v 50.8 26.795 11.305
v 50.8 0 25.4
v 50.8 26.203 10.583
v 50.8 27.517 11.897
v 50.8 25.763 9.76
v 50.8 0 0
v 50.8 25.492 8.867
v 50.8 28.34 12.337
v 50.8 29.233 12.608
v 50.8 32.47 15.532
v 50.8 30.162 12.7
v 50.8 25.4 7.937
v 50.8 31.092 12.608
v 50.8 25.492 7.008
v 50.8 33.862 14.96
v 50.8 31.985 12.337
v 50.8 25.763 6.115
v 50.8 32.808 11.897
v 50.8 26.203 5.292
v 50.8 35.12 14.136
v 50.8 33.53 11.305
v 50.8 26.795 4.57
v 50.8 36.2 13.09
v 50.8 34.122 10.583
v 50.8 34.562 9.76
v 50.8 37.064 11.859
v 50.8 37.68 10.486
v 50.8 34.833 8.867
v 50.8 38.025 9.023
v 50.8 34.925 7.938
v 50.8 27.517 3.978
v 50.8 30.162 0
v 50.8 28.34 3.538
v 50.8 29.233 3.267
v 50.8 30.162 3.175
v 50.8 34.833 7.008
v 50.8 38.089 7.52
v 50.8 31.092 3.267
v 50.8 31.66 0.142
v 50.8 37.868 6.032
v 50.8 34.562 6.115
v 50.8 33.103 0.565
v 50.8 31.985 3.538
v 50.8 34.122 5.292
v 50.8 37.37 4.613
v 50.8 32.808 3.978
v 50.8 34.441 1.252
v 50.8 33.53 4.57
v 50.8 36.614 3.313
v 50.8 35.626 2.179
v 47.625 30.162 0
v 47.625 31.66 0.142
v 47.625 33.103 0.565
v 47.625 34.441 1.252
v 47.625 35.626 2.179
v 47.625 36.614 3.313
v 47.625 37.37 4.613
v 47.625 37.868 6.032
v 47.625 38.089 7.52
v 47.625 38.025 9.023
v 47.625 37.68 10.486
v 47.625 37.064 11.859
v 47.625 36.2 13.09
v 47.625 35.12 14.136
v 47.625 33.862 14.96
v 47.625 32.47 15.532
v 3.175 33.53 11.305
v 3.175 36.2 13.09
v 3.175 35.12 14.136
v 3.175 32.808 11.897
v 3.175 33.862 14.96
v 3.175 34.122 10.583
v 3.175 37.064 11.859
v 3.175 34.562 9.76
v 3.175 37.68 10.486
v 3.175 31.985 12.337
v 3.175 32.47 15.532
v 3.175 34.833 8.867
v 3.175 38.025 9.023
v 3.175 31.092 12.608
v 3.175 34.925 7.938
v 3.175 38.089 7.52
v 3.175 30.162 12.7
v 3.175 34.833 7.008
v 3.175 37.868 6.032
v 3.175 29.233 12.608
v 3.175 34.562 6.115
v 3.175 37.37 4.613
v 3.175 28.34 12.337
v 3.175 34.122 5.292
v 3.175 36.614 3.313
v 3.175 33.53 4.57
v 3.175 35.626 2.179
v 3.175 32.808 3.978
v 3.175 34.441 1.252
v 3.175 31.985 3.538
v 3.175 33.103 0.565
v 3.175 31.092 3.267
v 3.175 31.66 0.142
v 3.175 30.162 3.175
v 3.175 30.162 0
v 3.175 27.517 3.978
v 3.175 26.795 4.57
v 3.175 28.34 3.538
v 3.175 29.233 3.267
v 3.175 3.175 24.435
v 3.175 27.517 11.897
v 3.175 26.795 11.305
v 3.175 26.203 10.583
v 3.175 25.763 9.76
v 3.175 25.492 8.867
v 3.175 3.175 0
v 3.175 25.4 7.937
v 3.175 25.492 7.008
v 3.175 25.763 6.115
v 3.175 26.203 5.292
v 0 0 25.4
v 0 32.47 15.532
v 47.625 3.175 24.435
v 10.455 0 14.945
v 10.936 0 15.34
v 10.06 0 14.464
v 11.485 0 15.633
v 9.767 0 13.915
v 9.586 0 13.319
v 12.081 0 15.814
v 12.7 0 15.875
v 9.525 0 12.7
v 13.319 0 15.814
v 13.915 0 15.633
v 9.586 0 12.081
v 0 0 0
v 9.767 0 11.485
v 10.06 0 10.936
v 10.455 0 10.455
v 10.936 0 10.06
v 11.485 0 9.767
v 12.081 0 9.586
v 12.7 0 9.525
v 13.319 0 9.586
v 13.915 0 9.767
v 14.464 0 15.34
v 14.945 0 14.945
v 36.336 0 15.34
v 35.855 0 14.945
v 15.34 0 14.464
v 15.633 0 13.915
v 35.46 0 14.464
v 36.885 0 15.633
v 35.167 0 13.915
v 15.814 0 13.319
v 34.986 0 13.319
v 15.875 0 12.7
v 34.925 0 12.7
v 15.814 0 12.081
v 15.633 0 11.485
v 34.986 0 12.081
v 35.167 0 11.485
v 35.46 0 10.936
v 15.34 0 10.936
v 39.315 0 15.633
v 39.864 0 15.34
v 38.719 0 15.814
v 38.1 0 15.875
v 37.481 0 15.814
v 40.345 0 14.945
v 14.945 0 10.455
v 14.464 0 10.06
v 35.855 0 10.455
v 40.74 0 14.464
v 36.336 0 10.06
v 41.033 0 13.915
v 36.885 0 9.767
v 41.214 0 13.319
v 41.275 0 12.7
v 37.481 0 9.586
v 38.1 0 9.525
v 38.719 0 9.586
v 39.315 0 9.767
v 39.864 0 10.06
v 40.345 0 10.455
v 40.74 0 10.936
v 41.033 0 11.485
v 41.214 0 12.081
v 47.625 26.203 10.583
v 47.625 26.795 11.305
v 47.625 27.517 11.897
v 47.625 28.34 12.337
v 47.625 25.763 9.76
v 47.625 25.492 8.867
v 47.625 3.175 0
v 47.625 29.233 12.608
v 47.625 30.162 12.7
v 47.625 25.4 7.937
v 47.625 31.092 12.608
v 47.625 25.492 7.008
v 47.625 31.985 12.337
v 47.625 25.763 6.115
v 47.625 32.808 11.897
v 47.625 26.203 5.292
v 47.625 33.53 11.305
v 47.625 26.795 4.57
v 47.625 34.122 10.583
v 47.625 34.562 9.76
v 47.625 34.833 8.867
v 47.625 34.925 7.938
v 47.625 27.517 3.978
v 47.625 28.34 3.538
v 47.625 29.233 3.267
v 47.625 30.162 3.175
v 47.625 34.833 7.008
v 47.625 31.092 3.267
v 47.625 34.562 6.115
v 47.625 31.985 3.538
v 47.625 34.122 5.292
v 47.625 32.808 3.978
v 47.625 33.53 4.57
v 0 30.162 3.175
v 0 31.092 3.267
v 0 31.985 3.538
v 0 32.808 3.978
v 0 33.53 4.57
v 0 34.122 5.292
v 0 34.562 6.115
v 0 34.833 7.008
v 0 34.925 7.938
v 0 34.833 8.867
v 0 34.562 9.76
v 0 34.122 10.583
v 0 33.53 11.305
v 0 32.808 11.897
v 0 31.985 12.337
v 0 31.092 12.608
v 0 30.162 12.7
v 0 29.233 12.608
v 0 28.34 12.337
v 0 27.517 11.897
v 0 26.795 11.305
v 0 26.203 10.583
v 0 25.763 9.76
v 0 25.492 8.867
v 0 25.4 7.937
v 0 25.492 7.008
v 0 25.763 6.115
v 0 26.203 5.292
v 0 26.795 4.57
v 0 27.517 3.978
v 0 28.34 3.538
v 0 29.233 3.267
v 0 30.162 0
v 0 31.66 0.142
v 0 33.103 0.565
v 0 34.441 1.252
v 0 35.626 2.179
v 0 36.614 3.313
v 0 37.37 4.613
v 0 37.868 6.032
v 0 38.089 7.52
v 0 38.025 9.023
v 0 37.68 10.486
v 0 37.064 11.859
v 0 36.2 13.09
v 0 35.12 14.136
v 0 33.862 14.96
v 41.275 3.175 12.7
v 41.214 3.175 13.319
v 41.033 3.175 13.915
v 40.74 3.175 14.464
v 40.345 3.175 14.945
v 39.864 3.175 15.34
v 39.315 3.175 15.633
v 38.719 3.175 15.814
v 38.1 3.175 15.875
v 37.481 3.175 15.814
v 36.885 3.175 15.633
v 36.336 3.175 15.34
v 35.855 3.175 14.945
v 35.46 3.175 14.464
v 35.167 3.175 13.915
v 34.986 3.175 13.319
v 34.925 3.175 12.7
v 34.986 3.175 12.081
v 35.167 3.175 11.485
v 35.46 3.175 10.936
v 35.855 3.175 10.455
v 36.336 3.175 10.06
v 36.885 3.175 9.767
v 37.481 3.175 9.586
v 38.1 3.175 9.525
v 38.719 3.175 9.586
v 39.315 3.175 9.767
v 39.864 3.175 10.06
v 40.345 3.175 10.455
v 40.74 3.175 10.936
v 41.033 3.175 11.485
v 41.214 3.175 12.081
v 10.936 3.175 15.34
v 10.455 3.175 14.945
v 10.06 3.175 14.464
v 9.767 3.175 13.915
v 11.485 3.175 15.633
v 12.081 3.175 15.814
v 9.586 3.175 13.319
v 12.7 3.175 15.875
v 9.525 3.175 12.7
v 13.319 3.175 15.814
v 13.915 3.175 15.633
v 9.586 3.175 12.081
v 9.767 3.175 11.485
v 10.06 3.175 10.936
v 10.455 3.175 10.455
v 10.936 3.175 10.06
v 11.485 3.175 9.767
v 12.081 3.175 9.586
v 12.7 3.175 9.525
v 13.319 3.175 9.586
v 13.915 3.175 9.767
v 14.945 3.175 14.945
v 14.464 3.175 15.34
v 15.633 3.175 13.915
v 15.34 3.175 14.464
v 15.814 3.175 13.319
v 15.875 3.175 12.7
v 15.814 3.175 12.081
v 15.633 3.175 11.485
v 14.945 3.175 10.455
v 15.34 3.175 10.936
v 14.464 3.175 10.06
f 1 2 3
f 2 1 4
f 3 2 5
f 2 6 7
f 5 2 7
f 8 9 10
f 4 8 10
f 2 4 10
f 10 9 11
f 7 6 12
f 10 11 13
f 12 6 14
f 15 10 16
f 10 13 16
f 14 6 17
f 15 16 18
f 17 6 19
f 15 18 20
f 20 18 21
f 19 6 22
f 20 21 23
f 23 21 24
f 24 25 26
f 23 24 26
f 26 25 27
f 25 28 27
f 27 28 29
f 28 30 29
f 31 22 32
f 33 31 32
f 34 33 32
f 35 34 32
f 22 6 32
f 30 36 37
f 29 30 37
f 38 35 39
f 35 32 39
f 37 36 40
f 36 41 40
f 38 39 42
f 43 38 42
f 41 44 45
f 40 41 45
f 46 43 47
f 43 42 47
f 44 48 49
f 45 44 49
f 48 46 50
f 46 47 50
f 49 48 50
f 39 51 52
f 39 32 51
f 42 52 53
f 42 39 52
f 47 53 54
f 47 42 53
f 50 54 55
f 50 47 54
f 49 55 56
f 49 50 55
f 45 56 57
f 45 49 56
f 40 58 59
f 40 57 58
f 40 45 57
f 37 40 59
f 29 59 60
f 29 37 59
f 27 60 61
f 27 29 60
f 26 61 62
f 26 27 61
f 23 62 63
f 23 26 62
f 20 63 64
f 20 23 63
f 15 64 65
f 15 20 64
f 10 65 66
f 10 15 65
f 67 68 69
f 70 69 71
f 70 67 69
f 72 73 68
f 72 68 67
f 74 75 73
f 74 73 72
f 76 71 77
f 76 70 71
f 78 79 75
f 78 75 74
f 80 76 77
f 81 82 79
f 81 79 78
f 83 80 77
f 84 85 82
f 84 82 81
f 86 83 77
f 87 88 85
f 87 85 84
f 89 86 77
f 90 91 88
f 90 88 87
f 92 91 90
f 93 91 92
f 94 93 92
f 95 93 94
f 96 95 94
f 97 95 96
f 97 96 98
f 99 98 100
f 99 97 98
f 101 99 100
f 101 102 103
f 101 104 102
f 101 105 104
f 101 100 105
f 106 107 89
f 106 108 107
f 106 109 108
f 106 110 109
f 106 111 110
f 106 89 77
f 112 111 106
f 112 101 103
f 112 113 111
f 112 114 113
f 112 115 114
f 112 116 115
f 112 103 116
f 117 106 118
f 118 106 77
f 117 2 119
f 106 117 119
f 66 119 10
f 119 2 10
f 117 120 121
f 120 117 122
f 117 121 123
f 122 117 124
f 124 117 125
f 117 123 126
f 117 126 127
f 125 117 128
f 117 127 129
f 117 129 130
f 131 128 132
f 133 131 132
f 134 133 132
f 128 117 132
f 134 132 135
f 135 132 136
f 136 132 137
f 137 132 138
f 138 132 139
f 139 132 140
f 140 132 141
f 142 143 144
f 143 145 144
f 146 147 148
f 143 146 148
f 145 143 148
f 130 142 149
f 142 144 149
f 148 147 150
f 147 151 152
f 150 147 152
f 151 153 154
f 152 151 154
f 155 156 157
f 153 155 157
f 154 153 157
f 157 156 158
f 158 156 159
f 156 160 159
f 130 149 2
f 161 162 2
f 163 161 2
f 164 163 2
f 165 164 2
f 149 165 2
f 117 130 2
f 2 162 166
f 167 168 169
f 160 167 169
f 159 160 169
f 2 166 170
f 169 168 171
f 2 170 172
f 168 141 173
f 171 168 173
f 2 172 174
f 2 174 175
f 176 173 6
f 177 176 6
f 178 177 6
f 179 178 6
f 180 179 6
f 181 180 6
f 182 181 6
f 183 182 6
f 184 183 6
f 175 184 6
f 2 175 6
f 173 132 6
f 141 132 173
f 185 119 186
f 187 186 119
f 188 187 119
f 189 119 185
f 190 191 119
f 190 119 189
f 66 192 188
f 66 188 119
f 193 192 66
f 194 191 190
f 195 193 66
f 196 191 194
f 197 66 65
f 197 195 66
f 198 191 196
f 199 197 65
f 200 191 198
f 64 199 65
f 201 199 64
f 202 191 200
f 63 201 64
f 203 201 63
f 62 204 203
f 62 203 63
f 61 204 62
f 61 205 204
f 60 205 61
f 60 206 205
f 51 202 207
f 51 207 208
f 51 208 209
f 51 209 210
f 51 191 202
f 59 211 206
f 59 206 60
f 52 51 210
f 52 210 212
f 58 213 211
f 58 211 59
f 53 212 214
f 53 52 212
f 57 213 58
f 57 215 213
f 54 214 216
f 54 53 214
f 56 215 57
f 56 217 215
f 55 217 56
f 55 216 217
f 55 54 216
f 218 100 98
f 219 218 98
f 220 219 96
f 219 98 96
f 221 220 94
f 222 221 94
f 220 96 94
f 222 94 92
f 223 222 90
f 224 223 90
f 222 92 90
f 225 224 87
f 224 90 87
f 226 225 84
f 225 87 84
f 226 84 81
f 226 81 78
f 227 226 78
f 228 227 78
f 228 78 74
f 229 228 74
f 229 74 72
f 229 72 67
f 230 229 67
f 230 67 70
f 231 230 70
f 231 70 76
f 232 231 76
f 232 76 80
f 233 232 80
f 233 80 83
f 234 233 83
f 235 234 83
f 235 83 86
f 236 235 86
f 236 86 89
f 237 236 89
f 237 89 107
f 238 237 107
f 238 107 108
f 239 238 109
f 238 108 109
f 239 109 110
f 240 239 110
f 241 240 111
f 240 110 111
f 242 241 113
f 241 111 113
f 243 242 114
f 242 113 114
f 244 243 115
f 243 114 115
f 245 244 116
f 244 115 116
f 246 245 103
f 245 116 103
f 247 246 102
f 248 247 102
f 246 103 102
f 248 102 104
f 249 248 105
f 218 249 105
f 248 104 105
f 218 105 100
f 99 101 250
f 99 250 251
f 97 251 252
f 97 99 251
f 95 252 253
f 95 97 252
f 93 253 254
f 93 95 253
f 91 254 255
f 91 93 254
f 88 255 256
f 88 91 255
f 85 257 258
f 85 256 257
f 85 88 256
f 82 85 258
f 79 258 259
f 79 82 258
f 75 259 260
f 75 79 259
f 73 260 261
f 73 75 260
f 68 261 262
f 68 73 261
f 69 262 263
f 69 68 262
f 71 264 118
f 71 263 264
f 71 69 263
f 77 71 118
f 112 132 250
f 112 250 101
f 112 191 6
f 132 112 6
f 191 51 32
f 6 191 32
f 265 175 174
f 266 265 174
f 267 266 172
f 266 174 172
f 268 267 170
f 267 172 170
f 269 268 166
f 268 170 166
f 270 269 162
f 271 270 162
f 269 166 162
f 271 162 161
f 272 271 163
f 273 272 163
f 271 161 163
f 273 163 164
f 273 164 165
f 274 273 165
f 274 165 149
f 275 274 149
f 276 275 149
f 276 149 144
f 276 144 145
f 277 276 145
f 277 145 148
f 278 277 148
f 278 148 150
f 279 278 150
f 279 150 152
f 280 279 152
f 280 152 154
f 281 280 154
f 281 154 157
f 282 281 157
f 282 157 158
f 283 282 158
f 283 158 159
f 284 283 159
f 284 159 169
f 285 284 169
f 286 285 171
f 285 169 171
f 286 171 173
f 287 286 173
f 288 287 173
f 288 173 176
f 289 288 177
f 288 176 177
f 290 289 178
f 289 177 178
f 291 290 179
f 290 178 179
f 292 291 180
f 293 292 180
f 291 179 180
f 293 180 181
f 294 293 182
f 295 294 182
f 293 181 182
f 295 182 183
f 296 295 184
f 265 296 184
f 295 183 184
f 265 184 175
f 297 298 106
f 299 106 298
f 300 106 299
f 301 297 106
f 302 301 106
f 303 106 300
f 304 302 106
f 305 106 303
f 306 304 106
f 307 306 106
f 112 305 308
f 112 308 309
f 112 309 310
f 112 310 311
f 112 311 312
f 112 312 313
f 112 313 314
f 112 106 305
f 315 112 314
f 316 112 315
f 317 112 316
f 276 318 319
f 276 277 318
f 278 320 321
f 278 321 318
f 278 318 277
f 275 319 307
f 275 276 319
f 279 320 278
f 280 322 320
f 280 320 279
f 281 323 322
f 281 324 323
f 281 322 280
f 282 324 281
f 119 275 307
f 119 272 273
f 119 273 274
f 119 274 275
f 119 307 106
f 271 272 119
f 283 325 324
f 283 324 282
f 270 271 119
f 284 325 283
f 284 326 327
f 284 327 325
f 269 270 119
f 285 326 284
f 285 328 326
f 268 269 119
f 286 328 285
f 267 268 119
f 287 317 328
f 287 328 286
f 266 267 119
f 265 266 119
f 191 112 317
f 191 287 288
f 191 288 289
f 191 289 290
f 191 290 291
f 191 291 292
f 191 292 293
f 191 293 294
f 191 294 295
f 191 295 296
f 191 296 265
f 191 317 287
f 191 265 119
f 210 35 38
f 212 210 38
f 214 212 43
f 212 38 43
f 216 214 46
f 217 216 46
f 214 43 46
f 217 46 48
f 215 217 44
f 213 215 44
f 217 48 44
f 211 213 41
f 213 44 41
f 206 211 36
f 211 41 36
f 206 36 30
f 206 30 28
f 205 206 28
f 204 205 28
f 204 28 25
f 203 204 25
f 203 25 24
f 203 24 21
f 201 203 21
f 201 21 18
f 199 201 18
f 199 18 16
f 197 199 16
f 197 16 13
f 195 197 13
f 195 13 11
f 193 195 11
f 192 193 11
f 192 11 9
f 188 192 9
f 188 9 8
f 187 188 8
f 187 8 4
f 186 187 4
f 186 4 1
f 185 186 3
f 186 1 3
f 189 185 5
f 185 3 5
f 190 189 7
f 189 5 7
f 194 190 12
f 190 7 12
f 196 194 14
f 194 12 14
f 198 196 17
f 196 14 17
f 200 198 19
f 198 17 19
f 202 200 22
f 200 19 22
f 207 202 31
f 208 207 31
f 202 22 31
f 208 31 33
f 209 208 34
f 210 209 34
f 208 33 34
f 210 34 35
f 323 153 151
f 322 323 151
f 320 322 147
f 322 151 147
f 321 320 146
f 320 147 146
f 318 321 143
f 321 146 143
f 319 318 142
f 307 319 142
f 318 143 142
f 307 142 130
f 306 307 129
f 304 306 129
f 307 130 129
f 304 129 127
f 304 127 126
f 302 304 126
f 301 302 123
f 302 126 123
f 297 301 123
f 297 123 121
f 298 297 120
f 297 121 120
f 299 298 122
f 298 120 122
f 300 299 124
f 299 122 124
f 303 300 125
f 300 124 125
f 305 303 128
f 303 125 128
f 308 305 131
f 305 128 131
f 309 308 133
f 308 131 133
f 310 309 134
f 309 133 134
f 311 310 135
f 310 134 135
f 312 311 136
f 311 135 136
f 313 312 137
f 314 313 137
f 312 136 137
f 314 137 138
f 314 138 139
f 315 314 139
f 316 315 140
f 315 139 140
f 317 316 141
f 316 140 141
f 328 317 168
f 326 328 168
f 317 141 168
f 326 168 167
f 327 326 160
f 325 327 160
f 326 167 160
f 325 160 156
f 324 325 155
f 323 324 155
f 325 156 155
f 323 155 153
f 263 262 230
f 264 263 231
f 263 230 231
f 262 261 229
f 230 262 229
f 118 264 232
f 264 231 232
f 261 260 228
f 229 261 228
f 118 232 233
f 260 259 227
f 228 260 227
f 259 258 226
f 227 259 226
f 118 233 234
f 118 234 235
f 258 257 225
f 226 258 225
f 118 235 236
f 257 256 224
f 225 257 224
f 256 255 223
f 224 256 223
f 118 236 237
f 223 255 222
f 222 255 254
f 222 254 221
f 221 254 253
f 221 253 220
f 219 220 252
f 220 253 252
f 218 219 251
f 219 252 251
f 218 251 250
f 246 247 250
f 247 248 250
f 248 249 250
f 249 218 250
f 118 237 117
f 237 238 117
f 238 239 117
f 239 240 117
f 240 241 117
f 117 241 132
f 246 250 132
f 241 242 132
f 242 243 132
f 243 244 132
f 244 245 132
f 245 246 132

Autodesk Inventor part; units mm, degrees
ref_plane "YZ Plane" through (0, 0, 0) normal (1, 0, 0) x (0, 1, 0)
ref_plane "XZ Plane" through (0, 0, 0) normal (0, 1, 0) x (-1, 0, 0)
ref_plane "XY Plane" through (0, 0, 0) normal (0, 0, 1) x (1, 0, 0)
sketch "Sketch1" plane through (0, 0, 0) normal (0, 0, 1) x (1, 0, 0)
  line L0 (0, 0) -> (50.8, 0)
  line L1 (50.8, 0) -> (50.8, 38.1)
  line L2 (0, 38.1) -> (0, 0)
  line L3 (3.175, 38.1) -> (3.175, 3.175)
  line L4 (3.175, 3.175) -> (47.625, 3.175)
  line L5 (47.625, 3.175) -> (47.625, 38.1)
  line L6 (50.8, 38.1) -> (47.625, 38.1)
  line L7 (3.175, 38.1) -> (0, 38.1)
  dimension "d0" = 38.1
  dimension "d1" = 50.8
  dimension "d2" = 3.175
  dimension "d3" = 3.175
  dimension "d4" = 3.175
extrude "Extrusion1" add sketch "Sketch1" along normal blind 25.4
sketch "Sketch2" plane through (50.8, 0, 0) normal (1, 0, 0) x (0, 0, -1)
  line L0 (-25.4, 38.1) -> (-25.4, 0) projected
  line L1 (0, 0) -> (-25.4, 0) projected
  line L2 (0, 0) -> (0, 38.1) projected
  line L3 (0, 38.1) -> (-25.4, 38.1) projected
  circle A0 centre (-7.9375, 30.1625) radius 4.7625
  arc A1 (0, 30.1625) -> (-15.532, 32.4705) centre (-7.9375, 30.1625) ccw
  line L4 (-25.4, 0) -> (-15.532, 32.4705)
  line L5 (0, 30.1625) -> (0, 0)
  dimension "d7" = 9.525
  dimension "d8" = 30.1625
  dimension "d9" = 17.4625
extrude "Extrusion2" cut sketch "Sketch2" against normal through all contours L3 A1 L4 L0 | L3 L2 A1 | A0
sketch "Sketch3" plane through (0, 0, 25.4) normal (0, -1, 0) x (1, 0, 0)
  line L0 (0, -25.4) -> (0, 0) projected
  line L1 (0, -25.4) -> (50.8, -25.4) projected
  line L2 (50.8, -25.4) -> (50.8, 0) projected
  circle A0 centre (12.7, -12.7) radius 3.175
  circle A1 centre (38.1, -12.7) radius 3.175
  dimension "d12" = 6.35
  dimension "d13" = 6.35
  dimension "d14" = 12.7
  dimension "d15" = 12.7
  dimension "d16" = 12.7
extrude "Extrusion3" cut sketch "Sketch3" against normal through all
equation "\"d3\" = d2"
equation "\"d4\" = d3"
equation "\"d13\" = d12"
equation "\"d15\" = d14"
equation "\"d16\" = d15"
properties part number "manipulator U bracket"
